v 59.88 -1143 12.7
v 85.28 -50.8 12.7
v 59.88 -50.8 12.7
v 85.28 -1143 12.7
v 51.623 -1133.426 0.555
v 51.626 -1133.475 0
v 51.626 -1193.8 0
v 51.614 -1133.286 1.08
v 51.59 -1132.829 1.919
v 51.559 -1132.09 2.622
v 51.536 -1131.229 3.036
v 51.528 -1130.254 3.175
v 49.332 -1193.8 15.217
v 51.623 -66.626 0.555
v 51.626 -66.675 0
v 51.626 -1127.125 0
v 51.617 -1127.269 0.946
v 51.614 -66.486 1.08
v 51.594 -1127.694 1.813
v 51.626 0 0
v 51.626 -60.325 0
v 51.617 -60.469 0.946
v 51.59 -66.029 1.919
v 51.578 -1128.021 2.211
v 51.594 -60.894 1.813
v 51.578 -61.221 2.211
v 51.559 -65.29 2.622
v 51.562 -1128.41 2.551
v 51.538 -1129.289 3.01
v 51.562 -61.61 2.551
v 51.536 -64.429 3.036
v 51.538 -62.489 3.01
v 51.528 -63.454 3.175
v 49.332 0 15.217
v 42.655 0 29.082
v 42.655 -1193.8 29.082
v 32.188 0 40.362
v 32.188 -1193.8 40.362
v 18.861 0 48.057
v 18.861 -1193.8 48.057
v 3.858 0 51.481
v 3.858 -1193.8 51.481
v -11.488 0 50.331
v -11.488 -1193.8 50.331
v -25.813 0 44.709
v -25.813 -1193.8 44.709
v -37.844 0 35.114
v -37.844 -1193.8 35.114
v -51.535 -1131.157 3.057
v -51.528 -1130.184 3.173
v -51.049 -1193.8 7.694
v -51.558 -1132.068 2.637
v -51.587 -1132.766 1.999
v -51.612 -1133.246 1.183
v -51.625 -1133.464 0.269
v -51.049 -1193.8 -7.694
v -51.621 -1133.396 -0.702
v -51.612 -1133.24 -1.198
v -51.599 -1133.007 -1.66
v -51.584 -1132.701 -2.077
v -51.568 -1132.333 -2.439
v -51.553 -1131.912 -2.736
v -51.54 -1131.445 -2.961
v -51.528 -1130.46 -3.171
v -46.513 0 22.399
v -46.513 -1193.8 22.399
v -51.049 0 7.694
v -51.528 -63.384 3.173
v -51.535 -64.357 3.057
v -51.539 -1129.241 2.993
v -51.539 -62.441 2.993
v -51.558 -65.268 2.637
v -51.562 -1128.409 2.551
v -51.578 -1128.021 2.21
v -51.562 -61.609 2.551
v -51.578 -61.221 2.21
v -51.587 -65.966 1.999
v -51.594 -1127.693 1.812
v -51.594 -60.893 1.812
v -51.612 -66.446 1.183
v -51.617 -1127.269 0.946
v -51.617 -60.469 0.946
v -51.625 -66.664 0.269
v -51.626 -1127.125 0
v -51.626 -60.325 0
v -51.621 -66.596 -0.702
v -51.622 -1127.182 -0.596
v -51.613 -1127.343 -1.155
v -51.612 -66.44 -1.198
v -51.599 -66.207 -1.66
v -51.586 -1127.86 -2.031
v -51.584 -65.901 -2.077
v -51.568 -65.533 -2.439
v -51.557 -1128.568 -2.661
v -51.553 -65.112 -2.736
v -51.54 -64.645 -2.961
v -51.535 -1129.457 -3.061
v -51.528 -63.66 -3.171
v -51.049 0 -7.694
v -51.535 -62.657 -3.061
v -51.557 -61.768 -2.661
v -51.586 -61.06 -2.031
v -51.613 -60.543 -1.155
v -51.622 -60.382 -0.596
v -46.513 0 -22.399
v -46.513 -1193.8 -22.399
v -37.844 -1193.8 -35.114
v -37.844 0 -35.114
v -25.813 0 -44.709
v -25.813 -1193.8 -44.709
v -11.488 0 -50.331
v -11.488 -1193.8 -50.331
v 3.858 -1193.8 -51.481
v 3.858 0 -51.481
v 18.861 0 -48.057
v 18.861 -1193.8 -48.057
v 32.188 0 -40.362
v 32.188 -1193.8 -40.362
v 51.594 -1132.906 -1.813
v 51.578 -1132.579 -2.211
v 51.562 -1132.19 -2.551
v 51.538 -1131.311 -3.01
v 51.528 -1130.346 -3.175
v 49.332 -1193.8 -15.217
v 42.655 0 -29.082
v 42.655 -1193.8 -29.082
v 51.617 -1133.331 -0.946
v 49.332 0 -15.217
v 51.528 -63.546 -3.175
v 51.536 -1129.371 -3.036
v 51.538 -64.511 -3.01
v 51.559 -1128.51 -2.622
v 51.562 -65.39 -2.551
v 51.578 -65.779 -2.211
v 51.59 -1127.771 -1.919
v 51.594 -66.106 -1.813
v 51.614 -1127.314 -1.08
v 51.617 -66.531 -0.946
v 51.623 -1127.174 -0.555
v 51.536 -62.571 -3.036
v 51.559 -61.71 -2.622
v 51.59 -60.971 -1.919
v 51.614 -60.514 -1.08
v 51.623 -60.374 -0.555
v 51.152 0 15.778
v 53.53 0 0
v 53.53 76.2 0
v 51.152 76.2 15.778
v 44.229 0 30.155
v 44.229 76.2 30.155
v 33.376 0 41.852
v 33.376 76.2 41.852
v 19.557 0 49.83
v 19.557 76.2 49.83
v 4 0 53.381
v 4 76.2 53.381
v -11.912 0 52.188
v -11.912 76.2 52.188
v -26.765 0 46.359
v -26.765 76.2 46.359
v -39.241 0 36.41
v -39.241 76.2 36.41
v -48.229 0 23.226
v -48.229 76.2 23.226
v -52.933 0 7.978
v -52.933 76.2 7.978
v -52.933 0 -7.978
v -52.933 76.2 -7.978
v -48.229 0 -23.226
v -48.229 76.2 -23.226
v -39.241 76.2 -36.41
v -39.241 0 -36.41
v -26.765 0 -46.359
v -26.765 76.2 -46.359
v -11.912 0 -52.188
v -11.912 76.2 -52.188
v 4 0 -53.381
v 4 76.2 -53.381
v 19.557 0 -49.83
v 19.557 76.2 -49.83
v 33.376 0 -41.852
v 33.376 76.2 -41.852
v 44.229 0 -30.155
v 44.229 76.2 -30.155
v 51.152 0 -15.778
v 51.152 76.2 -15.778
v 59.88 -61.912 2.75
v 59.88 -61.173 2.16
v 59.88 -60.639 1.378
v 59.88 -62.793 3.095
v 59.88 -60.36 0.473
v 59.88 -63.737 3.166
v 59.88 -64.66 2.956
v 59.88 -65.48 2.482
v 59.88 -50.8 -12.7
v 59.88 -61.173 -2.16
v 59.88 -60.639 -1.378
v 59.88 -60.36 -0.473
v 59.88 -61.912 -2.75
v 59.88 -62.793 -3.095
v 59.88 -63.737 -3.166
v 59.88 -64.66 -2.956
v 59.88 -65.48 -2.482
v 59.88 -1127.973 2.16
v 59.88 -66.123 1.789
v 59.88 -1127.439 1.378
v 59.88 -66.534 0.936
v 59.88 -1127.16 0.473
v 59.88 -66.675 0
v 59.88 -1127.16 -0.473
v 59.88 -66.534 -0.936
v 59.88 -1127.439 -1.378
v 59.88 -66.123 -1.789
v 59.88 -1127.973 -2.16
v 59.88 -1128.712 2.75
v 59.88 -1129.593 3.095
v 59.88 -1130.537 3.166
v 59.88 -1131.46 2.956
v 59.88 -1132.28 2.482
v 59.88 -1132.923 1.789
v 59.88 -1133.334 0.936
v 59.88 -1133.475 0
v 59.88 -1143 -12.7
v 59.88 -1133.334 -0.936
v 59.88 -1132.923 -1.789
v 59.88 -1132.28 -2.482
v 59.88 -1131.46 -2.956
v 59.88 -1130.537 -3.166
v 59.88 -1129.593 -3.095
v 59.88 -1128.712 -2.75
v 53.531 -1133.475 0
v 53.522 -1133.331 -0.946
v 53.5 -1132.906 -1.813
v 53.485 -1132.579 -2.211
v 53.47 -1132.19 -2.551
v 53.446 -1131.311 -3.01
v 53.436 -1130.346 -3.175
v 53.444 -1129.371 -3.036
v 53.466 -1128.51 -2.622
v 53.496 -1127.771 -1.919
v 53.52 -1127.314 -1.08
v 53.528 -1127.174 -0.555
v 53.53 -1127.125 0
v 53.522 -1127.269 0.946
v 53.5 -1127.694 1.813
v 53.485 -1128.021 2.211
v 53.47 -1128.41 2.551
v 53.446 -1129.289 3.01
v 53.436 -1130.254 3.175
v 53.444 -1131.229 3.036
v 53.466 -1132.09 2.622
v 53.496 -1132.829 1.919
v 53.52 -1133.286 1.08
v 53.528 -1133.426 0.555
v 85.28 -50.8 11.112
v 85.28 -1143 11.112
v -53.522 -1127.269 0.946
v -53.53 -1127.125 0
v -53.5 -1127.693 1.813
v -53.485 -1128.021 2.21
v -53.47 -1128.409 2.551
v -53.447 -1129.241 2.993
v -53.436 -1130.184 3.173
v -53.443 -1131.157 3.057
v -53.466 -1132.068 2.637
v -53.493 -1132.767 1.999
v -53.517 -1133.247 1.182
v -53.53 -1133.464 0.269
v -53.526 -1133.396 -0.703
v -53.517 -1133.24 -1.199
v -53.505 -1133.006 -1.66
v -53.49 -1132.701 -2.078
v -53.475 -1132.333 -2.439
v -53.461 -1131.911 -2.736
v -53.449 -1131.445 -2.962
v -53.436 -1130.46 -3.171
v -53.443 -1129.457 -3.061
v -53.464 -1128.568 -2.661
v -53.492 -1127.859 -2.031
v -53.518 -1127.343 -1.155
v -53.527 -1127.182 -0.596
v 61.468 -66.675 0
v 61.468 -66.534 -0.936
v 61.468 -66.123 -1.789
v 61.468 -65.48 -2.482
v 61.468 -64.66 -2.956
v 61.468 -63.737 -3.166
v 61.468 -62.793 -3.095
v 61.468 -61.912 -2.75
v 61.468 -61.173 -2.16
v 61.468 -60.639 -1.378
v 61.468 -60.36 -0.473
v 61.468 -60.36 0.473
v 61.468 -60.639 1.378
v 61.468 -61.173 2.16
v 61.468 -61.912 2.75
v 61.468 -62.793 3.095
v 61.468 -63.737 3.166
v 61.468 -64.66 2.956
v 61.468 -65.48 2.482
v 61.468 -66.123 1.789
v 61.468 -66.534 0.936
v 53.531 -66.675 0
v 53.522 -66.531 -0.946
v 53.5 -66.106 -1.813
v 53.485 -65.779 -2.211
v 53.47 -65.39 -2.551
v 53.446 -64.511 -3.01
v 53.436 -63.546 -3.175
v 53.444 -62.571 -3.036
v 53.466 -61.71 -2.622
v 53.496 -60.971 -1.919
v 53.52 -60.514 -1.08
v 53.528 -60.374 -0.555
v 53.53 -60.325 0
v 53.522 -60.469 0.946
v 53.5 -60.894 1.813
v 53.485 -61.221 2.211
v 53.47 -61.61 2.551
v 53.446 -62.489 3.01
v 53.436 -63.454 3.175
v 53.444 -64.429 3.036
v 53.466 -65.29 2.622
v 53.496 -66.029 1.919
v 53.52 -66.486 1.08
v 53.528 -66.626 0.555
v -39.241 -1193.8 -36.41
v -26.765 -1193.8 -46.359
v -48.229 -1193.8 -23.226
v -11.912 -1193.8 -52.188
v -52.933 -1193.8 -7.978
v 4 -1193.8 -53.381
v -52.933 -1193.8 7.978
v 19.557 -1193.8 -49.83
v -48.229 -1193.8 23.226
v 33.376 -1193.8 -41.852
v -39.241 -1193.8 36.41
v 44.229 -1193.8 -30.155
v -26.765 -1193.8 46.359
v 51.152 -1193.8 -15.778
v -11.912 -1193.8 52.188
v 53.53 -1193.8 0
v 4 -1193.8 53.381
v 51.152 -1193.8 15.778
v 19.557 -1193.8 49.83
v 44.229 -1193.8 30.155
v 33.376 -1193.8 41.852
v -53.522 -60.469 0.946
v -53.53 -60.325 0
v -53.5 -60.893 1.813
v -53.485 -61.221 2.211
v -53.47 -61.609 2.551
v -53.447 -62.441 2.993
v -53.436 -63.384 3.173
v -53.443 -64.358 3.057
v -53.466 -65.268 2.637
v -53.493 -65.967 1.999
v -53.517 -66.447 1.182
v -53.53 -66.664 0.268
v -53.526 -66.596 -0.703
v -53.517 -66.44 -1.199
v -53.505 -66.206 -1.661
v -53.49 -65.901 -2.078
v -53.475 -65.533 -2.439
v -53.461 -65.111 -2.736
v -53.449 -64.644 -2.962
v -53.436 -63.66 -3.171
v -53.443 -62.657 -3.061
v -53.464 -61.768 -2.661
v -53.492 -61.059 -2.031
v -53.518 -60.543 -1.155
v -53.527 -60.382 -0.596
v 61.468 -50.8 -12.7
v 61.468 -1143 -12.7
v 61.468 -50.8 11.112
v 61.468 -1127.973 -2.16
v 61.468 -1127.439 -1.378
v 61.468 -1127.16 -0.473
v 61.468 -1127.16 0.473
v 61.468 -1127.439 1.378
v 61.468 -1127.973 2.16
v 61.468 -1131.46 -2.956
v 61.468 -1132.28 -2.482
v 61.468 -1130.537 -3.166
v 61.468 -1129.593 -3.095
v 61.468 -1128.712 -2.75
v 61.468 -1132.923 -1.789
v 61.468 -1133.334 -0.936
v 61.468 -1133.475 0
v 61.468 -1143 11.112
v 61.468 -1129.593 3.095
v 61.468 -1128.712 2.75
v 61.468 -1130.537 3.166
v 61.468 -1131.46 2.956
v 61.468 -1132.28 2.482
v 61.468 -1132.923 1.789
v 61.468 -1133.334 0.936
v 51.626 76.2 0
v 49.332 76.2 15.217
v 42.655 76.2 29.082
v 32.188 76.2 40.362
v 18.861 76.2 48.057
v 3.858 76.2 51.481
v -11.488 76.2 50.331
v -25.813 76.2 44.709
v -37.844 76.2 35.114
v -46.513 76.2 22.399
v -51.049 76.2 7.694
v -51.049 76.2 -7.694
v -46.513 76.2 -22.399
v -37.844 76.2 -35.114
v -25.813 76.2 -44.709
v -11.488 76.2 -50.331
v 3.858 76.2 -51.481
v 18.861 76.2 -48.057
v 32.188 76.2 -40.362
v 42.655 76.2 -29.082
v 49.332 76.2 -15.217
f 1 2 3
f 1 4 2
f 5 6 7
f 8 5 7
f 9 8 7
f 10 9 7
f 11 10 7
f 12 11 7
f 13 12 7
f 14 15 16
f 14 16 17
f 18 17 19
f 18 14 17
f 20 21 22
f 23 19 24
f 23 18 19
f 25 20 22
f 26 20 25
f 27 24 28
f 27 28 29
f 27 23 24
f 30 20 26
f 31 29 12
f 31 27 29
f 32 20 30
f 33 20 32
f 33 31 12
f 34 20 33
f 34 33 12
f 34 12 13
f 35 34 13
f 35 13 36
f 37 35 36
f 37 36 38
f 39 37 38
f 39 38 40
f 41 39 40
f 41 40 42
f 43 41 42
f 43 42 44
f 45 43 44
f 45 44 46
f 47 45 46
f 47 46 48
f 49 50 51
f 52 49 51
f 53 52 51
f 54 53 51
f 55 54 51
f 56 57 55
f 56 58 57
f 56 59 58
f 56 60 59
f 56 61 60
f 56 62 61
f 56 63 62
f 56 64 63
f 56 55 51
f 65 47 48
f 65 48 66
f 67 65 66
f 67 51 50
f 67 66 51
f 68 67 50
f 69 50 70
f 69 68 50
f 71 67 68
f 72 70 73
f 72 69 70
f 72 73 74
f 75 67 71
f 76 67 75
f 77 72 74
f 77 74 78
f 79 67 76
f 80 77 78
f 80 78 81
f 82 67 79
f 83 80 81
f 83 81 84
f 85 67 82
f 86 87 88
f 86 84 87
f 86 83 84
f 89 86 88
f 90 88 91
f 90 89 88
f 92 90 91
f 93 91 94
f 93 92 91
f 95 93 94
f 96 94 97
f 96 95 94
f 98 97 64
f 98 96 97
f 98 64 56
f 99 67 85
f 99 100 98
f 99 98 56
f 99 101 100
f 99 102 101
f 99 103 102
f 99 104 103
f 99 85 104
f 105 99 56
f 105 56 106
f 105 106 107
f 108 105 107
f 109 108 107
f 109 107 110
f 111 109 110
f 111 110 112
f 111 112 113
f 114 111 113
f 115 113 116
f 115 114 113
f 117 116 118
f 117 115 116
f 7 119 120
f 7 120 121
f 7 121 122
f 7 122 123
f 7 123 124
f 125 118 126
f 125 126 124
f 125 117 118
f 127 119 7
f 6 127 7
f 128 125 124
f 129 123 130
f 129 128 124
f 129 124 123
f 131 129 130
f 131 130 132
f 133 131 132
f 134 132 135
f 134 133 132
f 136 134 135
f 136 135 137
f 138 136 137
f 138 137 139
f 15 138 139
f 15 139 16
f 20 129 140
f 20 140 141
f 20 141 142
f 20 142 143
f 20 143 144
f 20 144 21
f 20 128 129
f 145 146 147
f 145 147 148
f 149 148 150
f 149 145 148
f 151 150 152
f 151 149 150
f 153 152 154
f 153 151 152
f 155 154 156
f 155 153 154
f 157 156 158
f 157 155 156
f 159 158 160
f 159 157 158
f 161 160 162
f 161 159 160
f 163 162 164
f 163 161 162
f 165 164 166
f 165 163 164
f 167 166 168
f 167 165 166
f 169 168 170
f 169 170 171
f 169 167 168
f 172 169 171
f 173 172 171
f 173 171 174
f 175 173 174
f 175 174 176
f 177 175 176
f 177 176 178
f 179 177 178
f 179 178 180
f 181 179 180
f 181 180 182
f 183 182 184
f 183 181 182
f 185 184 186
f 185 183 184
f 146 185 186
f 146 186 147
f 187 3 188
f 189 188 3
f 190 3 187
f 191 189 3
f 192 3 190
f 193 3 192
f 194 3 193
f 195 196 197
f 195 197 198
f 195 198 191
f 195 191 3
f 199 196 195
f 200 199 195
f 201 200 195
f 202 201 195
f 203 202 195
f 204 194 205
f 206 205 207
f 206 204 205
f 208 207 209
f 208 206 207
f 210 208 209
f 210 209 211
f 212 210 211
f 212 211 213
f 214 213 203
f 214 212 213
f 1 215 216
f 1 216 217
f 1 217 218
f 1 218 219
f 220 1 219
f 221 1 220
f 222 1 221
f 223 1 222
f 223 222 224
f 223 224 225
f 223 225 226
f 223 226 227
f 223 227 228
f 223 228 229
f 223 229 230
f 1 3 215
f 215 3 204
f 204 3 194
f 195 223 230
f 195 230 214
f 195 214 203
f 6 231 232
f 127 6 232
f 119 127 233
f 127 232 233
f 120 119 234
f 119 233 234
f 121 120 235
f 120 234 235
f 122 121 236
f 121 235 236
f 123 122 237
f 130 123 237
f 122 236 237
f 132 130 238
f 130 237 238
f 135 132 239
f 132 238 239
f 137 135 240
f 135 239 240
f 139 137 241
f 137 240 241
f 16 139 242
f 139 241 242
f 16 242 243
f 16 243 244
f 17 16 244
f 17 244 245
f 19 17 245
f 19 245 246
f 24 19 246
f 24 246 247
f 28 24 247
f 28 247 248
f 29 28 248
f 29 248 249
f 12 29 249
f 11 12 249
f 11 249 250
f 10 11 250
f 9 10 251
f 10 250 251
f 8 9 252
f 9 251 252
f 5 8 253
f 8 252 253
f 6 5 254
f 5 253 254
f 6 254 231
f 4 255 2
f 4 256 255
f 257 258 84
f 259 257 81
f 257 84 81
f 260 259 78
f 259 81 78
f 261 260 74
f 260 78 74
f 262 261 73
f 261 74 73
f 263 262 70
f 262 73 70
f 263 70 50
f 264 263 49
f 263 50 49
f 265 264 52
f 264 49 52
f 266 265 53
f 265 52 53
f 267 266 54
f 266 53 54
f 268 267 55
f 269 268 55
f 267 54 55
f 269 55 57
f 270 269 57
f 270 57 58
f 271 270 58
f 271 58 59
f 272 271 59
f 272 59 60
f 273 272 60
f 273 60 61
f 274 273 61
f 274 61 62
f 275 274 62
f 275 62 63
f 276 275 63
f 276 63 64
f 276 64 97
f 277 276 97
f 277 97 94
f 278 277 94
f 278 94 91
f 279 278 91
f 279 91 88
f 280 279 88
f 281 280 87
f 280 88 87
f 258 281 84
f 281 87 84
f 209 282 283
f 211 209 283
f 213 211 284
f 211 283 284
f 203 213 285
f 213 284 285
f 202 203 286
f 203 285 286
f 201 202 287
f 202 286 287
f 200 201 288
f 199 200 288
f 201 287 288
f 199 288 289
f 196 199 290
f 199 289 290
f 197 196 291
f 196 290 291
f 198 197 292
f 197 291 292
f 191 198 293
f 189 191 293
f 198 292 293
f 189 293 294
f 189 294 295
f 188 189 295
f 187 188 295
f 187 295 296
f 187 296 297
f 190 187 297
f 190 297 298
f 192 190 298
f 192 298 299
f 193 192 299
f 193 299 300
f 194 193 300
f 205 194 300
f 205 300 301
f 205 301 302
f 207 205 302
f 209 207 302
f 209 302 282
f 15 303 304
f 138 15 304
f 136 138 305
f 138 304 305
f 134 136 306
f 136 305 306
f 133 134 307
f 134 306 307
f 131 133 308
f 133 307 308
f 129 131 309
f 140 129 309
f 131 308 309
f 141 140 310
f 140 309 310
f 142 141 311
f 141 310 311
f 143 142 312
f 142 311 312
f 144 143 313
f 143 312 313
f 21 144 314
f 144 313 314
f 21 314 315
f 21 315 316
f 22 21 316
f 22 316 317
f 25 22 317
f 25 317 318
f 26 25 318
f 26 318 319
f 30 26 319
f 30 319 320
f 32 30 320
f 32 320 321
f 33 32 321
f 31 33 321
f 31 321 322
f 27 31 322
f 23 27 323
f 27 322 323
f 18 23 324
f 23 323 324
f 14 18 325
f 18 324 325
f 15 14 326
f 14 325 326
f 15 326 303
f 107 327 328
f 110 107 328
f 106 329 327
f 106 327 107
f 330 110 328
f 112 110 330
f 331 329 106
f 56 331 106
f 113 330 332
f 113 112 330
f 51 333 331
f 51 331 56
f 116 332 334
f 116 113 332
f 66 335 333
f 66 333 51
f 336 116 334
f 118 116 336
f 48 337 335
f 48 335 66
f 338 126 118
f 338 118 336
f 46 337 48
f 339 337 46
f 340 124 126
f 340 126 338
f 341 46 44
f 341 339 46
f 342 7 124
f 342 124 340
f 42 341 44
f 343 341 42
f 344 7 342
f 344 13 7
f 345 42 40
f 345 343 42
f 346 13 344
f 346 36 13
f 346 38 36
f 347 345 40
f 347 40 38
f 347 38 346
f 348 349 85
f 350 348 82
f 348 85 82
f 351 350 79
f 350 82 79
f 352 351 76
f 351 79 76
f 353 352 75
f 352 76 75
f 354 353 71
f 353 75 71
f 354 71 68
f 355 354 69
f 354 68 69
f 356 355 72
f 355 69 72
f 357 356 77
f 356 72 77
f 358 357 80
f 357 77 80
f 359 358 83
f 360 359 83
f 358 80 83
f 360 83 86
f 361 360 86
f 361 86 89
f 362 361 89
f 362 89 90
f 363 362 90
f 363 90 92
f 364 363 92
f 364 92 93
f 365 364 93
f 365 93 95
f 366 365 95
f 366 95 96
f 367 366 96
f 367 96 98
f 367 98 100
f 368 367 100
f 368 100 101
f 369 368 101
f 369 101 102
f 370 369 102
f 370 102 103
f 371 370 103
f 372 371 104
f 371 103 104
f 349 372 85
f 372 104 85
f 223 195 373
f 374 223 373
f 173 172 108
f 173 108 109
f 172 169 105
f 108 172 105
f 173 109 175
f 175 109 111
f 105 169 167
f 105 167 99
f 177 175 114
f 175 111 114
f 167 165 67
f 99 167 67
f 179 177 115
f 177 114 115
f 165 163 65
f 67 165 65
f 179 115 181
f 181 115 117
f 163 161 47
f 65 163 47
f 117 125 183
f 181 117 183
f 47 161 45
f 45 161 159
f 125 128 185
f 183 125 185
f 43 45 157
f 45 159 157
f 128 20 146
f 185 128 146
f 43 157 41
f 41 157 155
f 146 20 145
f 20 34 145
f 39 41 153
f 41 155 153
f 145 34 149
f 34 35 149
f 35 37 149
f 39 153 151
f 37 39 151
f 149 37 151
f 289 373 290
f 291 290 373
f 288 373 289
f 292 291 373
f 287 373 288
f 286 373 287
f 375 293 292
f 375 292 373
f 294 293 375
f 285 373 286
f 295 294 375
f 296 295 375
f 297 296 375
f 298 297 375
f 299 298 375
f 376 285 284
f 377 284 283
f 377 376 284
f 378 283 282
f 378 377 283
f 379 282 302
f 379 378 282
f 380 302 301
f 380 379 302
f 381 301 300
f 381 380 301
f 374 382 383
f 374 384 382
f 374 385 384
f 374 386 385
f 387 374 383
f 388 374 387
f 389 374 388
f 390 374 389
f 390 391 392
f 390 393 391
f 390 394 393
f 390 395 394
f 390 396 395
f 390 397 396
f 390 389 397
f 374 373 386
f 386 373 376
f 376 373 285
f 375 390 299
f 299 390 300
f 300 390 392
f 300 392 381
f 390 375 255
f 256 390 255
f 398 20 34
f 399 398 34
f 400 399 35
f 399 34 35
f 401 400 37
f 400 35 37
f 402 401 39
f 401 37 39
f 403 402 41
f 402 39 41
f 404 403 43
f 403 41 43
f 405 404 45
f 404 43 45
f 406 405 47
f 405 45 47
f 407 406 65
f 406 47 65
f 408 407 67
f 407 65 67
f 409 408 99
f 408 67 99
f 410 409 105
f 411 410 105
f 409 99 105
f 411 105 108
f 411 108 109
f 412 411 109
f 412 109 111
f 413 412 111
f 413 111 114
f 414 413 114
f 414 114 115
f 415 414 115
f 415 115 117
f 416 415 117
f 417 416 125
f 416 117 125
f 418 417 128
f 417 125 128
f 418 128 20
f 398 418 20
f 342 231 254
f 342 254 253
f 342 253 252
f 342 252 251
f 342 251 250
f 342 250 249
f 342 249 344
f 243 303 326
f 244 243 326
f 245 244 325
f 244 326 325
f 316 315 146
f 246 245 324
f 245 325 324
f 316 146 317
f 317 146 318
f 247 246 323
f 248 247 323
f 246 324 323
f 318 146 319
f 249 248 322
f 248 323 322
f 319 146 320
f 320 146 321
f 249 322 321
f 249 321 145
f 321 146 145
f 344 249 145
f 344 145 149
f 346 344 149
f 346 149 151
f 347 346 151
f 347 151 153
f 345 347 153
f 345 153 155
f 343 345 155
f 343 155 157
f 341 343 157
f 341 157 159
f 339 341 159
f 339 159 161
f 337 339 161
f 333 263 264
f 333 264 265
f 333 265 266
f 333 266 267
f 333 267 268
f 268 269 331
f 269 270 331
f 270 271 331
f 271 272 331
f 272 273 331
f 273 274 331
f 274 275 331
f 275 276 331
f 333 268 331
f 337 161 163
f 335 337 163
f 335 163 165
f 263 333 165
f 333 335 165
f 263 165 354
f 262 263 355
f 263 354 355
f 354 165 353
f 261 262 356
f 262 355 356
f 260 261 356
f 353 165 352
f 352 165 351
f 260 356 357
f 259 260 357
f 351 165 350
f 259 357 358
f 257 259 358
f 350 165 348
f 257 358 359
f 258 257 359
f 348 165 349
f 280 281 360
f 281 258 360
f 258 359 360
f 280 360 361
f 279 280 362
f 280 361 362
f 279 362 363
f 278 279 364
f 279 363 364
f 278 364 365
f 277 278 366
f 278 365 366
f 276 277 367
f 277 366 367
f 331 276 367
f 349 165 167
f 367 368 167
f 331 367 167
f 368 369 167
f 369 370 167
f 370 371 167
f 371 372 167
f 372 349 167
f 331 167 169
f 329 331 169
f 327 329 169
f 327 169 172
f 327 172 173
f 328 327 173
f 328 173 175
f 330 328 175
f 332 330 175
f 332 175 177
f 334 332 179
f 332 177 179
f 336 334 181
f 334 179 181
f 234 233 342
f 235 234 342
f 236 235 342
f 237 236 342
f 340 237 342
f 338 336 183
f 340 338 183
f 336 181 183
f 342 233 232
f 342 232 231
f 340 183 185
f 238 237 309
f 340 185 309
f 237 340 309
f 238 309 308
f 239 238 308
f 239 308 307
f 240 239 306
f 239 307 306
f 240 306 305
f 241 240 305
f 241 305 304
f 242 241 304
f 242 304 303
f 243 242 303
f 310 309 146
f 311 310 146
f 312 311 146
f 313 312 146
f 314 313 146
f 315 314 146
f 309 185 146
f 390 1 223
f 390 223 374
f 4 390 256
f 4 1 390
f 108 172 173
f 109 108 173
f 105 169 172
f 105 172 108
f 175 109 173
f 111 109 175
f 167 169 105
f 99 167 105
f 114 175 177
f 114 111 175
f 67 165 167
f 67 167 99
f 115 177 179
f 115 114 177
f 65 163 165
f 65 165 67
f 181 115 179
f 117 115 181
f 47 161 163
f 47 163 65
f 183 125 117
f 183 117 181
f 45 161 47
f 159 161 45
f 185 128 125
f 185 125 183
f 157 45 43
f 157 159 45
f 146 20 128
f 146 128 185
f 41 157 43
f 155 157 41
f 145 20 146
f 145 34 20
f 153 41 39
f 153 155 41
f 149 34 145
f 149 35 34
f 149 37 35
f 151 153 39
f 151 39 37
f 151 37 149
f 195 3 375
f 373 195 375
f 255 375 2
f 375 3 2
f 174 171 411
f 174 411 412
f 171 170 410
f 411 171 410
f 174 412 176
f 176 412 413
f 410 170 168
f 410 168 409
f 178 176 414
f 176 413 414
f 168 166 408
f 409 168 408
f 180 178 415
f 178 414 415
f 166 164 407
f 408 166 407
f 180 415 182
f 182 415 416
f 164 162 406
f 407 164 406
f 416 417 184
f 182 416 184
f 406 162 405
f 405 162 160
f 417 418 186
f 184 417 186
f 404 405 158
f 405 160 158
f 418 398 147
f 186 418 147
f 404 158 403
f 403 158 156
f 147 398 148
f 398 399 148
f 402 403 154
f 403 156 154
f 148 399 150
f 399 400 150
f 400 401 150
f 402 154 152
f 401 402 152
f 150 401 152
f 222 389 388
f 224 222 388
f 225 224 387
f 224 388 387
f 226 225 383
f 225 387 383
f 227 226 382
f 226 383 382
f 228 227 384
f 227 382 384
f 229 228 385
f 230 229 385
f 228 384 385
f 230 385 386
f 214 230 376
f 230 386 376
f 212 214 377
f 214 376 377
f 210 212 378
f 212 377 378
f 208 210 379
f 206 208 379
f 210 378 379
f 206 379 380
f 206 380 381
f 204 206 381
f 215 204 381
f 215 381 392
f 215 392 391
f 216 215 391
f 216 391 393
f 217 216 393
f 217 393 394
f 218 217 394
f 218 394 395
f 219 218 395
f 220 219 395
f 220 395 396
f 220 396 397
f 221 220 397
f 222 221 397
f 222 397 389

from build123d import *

# Parameters (mm, degrees)
F0_R      = 53.5305
F0_R_2    = 51.6255
F1_DEPTH  = 1193.8
F2_DEPTH  = 76.2
F4_D      = 6.35
F4_DEPTH  = 53.5315
F5_D      = 6.35
F6_D      = 6.35
F6_DEPTH  = 53.5315001
F7_D      = 6.35
F11_DEPTH = 1066.8
F12_DEPTH = 12.7
F13_DEPTH = 12.7
F14_D     = 6.35
F15_D     = 6.35


with BuildPart() as f1:
    # F0 (on Front) → F1 (new body)
    with BuildSketch(Plane.XZ):
        Circle(F0_R)
        Circle(F0_R_2, mode=Mode.SUBTRACT)
    extrude(amount=F1_DEPTH)


with BuildPart() as f2:
    # F2 (new): a face of the model
    f2_faces = [f1.part.faces().sort_by_distance(p)[0] for p in [
        (-52.016428818, 0, 0),
    ]]
    extrude(f2_faces, amount=F2_DEPTH)


with BuildPart() as f1_1:
    add(f1.part)

    # F4 (through all, one way)
    with BuildSketch(Plane.YZ):
        with Locations((-1130.3, 0)):
            Circle(F4_D / 2)
    extrude(amount=-F4_DEPTH, mode=Mode.SUBTRACT)

    # F5 (through all)
    with Locations(Plane(origin=(0, 0, 0), x_dir=(0, 1, 0), z_dir=(-1, 0, 0))):
        with Locations((-1130.3, 0)):
            Hole(F5_D / 2)

    # F6 (through all, one way)
    with BuildSketch(Plane.YZ):
        with Locations((-63.5, 0)):
            Circle(F6_D / 2)
    extrude(amount=-F6_DEPTH, mode=Mode.SUBTRACT)

    # F7 (through all)
    with Locations(Plane(origin=(0, 0, 0), x_dir=(0, 1, 0), z_dir=(-1, 0, 0))):
        with Locations((-63.5, 0)):
            Hole(F7_D / 2)


with BuildPart() as f11:
    # F10 (on line) → F11 (new body, through all)
    with BuildSketch(Plane.XZ.offset(63.5)):
        Polygon((85.2805, 12.7), (59.8805, 12.7), (59.8805, -12.7), (61.468, -12.7), (61.468, 11.1125), (85.2805, 11.1125), align=None)
    extrude(amount=F11_DEPTH)

    # F12 (add): a face of the model
    f12_faces = [f11.faces().sort_by_distance(p)[0] for p in [
        (72.5805, -1130.3, 12.3407897552),
    ]]
    extrude(f12_faces, amount=F12_DEPTH)

    # F13 (add): a face of the model
    f13_faces = [f11.faces().sort_by_distance(p)[0] for p in [
        (72.5805, -63.5, 12.3407897552),
    ]]
    extrude(f13_faces, amount=F13_DEPTH)

    # F14 (through all)
    with Locations(Plane(origin=(0, 0, 0), x_dir=(0, 1, 0), z_dir=(-1, 0, 0))):
        with Locations((-1130.3, 0)):
            Hole(F14_D / 2)

    # F15 (through all)
    with Locations(Plane(origin=(0, 0, 0), x_dir=(0, 1, 0), z_dir=(-1, 0, 0))):
        with Locations((-63.5, 0)):
            Hole(F15_D / 2)


solid = Compound([f2.part, f1_1.part, f11.part])
